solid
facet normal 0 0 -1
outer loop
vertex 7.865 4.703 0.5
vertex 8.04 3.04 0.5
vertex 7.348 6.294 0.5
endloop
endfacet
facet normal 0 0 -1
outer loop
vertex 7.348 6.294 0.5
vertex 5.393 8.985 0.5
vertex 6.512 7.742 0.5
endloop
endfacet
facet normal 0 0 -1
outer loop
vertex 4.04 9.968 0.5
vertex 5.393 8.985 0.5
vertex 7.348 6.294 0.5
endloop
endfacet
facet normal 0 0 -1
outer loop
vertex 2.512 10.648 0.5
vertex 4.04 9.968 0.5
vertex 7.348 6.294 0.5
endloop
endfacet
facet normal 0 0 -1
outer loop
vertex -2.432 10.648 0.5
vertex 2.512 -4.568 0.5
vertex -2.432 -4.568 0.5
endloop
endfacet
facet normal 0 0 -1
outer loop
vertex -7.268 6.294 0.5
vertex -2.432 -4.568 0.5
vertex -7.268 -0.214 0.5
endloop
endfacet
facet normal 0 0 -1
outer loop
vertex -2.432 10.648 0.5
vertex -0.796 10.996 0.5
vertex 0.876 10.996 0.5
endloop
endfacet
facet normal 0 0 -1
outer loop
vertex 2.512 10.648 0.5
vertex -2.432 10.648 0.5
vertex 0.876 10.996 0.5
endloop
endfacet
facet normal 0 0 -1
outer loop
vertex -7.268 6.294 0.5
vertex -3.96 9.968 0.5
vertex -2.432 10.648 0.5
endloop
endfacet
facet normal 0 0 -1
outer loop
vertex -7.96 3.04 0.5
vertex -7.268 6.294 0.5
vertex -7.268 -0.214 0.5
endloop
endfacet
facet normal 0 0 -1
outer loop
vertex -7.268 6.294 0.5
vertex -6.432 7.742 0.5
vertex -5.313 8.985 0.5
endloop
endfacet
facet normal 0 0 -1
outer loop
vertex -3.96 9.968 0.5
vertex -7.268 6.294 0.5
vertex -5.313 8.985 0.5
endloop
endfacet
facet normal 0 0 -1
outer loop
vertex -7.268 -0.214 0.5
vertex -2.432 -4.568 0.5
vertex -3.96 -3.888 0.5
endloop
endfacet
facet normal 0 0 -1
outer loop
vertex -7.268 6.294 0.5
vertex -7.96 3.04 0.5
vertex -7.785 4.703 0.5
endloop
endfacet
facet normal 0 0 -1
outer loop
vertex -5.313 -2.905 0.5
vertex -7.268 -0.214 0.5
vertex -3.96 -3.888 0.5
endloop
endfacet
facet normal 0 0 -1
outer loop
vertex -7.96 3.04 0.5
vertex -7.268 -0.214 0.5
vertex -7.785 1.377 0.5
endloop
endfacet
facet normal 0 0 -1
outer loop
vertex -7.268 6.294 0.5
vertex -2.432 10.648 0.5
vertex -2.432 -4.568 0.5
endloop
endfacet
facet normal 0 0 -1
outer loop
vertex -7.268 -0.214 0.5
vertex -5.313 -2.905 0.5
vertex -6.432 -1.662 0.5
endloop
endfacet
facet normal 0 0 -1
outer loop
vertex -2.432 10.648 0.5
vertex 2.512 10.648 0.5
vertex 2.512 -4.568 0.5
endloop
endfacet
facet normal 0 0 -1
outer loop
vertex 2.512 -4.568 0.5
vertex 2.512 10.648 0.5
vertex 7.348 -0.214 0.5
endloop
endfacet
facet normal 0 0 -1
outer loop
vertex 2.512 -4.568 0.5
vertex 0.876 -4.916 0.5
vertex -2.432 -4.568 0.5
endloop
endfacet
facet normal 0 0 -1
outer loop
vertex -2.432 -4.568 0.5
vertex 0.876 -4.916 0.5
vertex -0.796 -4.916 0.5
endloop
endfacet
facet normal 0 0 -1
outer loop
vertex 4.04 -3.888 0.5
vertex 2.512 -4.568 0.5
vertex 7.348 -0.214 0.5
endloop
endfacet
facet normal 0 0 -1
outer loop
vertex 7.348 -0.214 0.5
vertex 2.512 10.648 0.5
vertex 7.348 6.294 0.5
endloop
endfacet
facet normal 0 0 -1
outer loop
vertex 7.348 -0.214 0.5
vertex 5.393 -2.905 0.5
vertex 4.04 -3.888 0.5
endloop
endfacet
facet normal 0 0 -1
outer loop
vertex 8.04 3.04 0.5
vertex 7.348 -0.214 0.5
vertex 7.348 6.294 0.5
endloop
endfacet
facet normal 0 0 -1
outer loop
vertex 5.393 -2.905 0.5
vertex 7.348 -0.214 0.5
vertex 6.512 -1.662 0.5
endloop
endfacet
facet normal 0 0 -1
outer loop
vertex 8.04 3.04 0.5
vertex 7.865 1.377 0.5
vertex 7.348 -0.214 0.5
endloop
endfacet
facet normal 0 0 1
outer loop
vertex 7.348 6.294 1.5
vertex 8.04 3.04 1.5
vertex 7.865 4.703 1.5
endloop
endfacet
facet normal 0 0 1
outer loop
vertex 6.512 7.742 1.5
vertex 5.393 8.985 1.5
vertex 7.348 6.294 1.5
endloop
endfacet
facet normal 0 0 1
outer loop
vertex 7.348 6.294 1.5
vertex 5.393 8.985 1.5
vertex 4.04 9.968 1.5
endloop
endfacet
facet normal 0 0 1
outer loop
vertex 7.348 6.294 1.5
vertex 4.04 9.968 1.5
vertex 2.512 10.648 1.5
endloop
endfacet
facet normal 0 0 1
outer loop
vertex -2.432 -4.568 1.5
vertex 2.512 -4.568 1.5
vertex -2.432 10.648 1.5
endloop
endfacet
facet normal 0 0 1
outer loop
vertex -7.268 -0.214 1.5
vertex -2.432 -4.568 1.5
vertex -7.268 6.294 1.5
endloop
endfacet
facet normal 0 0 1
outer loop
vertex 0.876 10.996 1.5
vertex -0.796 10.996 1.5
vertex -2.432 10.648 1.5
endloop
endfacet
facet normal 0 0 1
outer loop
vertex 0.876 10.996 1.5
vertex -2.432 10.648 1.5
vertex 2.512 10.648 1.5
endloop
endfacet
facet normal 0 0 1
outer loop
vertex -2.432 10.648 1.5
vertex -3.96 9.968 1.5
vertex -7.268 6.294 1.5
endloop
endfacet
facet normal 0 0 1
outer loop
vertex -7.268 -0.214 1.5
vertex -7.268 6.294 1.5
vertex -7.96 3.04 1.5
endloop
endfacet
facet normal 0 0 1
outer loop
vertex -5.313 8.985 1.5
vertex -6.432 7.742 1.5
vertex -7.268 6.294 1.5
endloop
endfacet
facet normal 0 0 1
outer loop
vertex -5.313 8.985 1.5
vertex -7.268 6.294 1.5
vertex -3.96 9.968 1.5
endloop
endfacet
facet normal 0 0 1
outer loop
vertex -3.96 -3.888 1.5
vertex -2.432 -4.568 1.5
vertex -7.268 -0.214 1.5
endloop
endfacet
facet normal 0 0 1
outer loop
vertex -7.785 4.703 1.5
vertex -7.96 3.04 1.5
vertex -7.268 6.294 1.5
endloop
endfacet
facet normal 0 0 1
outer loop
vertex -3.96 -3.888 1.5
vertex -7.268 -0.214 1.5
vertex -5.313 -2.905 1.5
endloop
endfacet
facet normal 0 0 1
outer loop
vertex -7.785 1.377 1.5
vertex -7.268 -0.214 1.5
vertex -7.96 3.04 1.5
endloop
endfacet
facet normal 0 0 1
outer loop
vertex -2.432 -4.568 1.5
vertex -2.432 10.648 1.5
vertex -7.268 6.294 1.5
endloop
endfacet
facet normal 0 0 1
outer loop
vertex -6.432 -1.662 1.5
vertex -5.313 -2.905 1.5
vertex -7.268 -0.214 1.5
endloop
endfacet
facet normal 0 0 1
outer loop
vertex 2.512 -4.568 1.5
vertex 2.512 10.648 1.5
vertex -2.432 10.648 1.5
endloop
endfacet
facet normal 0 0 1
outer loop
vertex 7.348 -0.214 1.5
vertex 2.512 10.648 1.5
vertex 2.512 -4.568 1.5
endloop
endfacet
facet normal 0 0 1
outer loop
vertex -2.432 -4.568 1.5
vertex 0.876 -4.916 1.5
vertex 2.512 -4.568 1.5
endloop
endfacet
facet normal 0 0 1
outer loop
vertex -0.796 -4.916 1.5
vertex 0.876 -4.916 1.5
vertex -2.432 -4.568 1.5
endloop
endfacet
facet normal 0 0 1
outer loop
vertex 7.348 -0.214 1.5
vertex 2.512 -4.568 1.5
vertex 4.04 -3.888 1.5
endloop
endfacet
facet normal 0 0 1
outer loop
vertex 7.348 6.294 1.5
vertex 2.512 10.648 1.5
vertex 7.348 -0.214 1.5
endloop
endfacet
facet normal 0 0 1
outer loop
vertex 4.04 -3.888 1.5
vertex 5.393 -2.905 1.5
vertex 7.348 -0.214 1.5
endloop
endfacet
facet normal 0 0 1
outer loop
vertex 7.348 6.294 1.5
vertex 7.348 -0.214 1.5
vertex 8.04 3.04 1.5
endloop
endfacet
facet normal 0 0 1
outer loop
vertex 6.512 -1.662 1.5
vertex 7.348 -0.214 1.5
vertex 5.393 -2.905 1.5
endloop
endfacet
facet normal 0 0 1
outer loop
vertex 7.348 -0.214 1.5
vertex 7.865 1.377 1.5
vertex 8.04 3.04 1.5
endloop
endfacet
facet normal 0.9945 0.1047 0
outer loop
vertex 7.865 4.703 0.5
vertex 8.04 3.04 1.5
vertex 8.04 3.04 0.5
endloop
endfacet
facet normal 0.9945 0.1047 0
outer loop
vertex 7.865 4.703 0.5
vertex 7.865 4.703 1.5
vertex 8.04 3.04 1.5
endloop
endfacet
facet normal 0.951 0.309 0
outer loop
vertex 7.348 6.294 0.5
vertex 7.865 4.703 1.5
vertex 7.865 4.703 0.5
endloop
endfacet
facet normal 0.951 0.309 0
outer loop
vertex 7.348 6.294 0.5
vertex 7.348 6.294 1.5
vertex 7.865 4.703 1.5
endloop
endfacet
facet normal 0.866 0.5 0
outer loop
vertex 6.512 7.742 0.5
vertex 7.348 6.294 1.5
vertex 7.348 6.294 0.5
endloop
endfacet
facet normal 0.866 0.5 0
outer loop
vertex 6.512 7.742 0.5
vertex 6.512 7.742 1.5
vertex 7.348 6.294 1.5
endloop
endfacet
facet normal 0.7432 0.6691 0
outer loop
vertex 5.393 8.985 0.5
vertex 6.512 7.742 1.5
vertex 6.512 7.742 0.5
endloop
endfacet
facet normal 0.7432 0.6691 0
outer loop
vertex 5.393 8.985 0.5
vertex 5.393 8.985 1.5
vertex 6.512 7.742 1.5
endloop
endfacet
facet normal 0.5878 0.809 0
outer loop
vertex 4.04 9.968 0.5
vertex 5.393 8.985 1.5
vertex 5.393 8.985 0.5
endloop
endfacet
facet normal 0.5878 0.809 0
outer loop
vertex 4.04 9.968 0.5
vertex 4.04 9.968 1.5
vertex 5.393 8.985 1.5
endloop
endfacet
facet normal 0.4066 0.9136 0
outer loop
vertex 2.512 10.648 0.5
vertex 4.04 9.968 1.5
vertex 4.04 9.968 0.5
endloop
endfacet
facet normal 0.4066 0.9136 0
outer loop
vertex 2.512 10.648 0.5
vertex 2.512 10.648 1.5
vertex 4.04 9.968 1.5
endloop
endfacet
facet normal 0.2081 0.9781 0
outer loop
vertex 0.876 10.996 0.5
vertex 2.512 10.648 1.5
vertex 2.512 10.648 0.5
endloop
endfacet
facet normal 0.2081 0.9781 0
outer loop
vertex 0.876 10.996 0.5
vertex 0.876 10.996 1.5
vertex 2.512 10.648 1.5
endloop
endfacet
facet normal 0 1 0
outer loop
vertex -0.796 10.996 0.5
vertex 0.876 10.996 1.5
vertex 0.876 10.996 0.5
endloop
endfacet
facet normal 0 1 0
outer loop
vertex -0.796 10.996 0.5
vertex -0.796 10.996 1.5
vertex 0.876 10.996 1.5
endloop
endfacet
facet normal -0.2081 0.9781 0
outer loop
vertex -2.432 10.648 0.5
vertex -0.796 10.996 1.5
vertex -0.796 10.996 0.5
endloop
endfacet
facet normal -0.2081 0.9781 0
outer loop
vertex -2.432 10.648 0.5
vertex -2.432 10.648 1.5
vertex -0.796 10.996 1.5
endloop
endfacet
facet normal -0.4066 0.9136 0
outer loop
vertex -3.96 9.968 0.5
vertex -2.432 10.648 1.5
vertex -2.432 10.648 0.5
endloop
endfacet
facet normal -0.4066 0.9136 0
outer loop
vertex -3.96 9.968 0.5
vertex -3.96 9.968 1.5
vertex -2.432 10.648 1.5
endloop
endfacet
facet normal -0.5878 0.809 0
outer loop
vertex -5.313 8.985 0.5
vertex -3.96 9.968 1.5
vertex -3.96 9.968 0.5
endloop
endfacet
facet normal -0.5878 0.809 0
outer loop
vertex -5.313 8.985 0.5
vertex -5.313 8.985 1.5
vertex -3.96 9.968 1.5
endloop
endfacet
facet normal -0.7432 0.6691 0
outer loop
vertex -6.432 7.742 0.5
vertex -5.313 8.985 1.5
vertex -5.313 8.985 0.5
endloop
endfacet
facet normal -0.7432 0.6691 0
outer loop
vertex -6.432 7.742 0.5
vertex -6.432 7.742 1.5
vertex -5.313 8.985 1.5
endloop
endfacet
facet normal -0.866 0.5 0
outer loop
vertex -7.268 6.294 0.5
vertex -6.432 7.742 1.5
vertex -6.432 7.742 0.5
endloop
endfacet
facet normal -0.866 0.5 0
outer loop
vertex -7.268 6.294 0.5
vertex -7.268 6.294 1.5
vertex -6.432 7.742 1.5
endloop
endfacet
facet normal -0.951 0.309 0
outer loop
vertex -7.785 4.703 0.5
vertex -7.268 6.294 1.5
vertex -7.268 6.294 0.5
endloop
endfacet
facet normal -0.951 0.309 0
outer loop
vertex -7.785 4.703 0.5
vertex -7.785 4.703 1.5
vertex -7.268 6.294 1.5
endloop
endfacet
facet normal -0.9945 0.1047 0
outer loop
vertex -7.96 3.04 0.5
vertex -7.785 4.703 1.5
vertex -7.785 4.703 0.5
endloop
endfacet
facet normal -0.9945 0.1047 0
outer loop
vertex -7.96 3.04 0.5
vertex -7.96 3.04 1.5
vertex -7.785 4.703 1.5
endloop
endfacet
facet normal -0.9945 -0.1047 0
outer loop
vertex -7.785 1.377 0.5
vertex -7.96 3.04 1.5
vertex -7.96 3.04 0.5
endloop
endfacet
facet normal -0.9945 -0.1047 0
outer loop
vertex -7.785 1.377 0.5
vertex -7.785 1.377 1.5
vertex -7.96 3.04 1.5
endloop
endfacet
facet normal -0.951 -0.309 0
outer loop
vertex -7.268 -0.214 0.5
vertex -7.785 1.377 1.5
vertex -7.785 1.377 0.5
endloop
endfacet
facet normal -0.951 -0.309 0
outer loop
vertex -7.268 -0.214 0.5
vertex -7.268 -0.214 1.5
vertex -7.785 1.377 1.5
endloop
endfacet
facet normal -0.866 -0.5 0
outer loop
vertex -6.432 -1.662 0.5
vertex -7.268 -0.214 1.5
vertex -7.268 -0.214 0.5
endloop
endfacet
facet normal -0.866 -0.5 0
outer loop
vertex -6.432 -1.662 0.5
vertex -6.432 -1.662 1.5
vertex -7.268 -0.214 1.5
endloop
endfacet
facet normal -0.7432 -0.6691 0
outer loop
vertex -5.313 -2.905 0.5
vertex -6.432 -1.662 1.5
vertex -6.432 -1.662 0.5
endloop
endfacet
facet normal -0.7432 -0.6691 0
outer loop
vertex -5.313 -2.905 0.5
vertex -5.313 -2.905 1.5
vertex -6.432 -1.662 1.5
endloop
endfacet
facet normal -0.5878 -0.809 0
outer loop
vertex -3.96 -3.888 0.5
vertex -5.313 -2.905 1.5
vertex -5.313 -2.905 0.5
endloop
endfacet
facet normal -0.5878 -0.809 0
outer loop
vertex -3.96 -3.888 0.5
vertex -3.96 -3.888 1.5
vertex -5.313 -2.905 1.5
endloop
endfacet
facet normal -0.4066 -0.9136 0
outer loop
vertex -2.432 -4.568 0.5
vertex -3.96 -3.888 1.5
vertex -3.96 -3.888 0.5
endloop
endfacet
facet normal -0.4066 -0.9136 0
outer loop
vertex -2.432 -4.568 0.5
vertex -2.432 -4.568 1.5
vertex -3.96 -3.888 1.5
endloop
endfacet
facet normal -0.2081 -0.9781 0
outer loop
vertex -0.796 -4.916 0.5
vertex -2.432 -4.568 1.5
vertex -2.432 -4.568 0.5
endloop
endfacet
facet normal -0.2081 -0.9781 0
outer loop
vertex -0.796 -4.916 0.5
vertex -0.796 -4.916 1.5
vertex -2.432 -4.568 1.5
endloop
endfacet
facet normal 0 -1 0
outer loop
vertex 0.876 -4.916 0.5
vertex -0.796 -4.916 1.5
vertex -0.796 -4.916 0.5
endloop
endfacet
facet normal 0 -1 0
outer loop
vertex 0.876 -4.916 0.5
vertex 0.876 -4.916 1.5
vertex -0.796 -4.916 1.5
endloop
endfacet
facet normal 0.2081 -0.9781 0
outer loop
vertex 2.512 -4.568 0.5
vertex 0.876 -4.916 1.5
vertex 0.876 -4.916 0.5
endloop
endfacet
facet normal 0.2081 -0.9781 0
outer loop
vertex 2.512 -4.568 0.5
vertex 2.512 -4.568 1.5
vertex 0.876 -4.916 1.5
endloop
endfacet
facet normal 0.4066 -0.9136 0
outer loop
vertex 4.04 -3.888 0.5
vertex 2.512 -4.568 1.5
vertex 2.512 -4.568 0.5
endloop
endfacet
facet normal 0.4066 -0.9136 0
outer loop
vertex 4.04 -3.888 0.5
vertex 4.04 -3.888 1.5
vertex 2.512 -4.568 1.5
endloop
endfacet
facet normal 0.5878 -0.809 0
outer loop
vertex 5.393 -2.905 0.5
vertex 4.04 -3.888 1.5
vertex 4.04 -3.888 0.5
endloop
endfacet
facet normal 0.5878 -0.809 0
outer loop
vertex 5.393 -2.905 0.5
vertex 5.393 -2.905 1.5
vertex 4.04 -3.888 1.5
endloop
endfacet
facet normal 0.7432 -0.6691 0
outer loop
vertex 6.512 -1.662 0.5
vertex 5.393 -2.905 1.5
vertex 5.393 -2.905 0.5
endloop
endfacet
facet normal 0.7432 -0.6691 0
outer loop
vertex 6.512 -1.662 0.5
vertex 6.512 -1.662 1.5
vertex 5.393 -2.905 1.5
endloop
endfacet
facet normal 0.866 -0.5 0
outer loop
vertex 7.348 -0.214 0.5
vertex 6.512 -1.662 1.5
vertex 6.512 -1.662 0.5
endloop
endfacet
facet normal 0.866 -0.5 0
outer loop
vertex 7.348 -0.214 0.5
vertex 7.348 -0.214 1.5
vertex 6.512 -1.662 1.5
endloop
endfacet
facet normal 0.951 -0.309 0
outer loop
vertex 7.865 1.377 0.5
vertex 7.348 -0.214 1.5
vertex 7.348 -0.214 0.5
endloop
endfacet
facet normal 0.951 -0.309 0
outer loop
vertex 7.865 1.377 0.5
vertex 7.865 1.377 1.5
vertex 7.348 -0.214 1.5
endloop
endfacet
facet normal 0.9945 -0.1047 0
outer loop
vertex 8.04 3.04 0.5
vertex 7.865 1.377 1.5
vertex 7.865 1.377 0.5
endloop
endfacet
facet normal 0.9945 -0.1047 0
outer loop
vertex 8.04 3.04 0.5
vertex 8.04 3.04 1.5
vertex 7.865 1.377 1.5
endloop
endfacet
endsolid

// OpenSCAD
module etn() {
	linear_extrude(2) import("EtnAmpersand.dxf");
}

module kolo(velikost) {
	translate([velikost, velikost * 76, 0.5]) {
		color("black") {
			linear_extrude(1) circle(r=velikost * 200);
		}
	}
}

module logo(velikost) {
	translate([0, 0, 1]) difference() {
		kolo(velikost);
		etn();
	}
}

module nausnice(i, velikost) {
	translate([20 * i, 0, 0]) scale([velikost, velikost, 1]) {
		//logo(velikost);
		color("red") translate([0, 0, -0.0]) kolo(velikost);
	}
}

//nausnice(-1, 0.15);
nausnice(0, 0.20);
//nausnice(1, 0.25);
//nausnice(2, 0.30);
